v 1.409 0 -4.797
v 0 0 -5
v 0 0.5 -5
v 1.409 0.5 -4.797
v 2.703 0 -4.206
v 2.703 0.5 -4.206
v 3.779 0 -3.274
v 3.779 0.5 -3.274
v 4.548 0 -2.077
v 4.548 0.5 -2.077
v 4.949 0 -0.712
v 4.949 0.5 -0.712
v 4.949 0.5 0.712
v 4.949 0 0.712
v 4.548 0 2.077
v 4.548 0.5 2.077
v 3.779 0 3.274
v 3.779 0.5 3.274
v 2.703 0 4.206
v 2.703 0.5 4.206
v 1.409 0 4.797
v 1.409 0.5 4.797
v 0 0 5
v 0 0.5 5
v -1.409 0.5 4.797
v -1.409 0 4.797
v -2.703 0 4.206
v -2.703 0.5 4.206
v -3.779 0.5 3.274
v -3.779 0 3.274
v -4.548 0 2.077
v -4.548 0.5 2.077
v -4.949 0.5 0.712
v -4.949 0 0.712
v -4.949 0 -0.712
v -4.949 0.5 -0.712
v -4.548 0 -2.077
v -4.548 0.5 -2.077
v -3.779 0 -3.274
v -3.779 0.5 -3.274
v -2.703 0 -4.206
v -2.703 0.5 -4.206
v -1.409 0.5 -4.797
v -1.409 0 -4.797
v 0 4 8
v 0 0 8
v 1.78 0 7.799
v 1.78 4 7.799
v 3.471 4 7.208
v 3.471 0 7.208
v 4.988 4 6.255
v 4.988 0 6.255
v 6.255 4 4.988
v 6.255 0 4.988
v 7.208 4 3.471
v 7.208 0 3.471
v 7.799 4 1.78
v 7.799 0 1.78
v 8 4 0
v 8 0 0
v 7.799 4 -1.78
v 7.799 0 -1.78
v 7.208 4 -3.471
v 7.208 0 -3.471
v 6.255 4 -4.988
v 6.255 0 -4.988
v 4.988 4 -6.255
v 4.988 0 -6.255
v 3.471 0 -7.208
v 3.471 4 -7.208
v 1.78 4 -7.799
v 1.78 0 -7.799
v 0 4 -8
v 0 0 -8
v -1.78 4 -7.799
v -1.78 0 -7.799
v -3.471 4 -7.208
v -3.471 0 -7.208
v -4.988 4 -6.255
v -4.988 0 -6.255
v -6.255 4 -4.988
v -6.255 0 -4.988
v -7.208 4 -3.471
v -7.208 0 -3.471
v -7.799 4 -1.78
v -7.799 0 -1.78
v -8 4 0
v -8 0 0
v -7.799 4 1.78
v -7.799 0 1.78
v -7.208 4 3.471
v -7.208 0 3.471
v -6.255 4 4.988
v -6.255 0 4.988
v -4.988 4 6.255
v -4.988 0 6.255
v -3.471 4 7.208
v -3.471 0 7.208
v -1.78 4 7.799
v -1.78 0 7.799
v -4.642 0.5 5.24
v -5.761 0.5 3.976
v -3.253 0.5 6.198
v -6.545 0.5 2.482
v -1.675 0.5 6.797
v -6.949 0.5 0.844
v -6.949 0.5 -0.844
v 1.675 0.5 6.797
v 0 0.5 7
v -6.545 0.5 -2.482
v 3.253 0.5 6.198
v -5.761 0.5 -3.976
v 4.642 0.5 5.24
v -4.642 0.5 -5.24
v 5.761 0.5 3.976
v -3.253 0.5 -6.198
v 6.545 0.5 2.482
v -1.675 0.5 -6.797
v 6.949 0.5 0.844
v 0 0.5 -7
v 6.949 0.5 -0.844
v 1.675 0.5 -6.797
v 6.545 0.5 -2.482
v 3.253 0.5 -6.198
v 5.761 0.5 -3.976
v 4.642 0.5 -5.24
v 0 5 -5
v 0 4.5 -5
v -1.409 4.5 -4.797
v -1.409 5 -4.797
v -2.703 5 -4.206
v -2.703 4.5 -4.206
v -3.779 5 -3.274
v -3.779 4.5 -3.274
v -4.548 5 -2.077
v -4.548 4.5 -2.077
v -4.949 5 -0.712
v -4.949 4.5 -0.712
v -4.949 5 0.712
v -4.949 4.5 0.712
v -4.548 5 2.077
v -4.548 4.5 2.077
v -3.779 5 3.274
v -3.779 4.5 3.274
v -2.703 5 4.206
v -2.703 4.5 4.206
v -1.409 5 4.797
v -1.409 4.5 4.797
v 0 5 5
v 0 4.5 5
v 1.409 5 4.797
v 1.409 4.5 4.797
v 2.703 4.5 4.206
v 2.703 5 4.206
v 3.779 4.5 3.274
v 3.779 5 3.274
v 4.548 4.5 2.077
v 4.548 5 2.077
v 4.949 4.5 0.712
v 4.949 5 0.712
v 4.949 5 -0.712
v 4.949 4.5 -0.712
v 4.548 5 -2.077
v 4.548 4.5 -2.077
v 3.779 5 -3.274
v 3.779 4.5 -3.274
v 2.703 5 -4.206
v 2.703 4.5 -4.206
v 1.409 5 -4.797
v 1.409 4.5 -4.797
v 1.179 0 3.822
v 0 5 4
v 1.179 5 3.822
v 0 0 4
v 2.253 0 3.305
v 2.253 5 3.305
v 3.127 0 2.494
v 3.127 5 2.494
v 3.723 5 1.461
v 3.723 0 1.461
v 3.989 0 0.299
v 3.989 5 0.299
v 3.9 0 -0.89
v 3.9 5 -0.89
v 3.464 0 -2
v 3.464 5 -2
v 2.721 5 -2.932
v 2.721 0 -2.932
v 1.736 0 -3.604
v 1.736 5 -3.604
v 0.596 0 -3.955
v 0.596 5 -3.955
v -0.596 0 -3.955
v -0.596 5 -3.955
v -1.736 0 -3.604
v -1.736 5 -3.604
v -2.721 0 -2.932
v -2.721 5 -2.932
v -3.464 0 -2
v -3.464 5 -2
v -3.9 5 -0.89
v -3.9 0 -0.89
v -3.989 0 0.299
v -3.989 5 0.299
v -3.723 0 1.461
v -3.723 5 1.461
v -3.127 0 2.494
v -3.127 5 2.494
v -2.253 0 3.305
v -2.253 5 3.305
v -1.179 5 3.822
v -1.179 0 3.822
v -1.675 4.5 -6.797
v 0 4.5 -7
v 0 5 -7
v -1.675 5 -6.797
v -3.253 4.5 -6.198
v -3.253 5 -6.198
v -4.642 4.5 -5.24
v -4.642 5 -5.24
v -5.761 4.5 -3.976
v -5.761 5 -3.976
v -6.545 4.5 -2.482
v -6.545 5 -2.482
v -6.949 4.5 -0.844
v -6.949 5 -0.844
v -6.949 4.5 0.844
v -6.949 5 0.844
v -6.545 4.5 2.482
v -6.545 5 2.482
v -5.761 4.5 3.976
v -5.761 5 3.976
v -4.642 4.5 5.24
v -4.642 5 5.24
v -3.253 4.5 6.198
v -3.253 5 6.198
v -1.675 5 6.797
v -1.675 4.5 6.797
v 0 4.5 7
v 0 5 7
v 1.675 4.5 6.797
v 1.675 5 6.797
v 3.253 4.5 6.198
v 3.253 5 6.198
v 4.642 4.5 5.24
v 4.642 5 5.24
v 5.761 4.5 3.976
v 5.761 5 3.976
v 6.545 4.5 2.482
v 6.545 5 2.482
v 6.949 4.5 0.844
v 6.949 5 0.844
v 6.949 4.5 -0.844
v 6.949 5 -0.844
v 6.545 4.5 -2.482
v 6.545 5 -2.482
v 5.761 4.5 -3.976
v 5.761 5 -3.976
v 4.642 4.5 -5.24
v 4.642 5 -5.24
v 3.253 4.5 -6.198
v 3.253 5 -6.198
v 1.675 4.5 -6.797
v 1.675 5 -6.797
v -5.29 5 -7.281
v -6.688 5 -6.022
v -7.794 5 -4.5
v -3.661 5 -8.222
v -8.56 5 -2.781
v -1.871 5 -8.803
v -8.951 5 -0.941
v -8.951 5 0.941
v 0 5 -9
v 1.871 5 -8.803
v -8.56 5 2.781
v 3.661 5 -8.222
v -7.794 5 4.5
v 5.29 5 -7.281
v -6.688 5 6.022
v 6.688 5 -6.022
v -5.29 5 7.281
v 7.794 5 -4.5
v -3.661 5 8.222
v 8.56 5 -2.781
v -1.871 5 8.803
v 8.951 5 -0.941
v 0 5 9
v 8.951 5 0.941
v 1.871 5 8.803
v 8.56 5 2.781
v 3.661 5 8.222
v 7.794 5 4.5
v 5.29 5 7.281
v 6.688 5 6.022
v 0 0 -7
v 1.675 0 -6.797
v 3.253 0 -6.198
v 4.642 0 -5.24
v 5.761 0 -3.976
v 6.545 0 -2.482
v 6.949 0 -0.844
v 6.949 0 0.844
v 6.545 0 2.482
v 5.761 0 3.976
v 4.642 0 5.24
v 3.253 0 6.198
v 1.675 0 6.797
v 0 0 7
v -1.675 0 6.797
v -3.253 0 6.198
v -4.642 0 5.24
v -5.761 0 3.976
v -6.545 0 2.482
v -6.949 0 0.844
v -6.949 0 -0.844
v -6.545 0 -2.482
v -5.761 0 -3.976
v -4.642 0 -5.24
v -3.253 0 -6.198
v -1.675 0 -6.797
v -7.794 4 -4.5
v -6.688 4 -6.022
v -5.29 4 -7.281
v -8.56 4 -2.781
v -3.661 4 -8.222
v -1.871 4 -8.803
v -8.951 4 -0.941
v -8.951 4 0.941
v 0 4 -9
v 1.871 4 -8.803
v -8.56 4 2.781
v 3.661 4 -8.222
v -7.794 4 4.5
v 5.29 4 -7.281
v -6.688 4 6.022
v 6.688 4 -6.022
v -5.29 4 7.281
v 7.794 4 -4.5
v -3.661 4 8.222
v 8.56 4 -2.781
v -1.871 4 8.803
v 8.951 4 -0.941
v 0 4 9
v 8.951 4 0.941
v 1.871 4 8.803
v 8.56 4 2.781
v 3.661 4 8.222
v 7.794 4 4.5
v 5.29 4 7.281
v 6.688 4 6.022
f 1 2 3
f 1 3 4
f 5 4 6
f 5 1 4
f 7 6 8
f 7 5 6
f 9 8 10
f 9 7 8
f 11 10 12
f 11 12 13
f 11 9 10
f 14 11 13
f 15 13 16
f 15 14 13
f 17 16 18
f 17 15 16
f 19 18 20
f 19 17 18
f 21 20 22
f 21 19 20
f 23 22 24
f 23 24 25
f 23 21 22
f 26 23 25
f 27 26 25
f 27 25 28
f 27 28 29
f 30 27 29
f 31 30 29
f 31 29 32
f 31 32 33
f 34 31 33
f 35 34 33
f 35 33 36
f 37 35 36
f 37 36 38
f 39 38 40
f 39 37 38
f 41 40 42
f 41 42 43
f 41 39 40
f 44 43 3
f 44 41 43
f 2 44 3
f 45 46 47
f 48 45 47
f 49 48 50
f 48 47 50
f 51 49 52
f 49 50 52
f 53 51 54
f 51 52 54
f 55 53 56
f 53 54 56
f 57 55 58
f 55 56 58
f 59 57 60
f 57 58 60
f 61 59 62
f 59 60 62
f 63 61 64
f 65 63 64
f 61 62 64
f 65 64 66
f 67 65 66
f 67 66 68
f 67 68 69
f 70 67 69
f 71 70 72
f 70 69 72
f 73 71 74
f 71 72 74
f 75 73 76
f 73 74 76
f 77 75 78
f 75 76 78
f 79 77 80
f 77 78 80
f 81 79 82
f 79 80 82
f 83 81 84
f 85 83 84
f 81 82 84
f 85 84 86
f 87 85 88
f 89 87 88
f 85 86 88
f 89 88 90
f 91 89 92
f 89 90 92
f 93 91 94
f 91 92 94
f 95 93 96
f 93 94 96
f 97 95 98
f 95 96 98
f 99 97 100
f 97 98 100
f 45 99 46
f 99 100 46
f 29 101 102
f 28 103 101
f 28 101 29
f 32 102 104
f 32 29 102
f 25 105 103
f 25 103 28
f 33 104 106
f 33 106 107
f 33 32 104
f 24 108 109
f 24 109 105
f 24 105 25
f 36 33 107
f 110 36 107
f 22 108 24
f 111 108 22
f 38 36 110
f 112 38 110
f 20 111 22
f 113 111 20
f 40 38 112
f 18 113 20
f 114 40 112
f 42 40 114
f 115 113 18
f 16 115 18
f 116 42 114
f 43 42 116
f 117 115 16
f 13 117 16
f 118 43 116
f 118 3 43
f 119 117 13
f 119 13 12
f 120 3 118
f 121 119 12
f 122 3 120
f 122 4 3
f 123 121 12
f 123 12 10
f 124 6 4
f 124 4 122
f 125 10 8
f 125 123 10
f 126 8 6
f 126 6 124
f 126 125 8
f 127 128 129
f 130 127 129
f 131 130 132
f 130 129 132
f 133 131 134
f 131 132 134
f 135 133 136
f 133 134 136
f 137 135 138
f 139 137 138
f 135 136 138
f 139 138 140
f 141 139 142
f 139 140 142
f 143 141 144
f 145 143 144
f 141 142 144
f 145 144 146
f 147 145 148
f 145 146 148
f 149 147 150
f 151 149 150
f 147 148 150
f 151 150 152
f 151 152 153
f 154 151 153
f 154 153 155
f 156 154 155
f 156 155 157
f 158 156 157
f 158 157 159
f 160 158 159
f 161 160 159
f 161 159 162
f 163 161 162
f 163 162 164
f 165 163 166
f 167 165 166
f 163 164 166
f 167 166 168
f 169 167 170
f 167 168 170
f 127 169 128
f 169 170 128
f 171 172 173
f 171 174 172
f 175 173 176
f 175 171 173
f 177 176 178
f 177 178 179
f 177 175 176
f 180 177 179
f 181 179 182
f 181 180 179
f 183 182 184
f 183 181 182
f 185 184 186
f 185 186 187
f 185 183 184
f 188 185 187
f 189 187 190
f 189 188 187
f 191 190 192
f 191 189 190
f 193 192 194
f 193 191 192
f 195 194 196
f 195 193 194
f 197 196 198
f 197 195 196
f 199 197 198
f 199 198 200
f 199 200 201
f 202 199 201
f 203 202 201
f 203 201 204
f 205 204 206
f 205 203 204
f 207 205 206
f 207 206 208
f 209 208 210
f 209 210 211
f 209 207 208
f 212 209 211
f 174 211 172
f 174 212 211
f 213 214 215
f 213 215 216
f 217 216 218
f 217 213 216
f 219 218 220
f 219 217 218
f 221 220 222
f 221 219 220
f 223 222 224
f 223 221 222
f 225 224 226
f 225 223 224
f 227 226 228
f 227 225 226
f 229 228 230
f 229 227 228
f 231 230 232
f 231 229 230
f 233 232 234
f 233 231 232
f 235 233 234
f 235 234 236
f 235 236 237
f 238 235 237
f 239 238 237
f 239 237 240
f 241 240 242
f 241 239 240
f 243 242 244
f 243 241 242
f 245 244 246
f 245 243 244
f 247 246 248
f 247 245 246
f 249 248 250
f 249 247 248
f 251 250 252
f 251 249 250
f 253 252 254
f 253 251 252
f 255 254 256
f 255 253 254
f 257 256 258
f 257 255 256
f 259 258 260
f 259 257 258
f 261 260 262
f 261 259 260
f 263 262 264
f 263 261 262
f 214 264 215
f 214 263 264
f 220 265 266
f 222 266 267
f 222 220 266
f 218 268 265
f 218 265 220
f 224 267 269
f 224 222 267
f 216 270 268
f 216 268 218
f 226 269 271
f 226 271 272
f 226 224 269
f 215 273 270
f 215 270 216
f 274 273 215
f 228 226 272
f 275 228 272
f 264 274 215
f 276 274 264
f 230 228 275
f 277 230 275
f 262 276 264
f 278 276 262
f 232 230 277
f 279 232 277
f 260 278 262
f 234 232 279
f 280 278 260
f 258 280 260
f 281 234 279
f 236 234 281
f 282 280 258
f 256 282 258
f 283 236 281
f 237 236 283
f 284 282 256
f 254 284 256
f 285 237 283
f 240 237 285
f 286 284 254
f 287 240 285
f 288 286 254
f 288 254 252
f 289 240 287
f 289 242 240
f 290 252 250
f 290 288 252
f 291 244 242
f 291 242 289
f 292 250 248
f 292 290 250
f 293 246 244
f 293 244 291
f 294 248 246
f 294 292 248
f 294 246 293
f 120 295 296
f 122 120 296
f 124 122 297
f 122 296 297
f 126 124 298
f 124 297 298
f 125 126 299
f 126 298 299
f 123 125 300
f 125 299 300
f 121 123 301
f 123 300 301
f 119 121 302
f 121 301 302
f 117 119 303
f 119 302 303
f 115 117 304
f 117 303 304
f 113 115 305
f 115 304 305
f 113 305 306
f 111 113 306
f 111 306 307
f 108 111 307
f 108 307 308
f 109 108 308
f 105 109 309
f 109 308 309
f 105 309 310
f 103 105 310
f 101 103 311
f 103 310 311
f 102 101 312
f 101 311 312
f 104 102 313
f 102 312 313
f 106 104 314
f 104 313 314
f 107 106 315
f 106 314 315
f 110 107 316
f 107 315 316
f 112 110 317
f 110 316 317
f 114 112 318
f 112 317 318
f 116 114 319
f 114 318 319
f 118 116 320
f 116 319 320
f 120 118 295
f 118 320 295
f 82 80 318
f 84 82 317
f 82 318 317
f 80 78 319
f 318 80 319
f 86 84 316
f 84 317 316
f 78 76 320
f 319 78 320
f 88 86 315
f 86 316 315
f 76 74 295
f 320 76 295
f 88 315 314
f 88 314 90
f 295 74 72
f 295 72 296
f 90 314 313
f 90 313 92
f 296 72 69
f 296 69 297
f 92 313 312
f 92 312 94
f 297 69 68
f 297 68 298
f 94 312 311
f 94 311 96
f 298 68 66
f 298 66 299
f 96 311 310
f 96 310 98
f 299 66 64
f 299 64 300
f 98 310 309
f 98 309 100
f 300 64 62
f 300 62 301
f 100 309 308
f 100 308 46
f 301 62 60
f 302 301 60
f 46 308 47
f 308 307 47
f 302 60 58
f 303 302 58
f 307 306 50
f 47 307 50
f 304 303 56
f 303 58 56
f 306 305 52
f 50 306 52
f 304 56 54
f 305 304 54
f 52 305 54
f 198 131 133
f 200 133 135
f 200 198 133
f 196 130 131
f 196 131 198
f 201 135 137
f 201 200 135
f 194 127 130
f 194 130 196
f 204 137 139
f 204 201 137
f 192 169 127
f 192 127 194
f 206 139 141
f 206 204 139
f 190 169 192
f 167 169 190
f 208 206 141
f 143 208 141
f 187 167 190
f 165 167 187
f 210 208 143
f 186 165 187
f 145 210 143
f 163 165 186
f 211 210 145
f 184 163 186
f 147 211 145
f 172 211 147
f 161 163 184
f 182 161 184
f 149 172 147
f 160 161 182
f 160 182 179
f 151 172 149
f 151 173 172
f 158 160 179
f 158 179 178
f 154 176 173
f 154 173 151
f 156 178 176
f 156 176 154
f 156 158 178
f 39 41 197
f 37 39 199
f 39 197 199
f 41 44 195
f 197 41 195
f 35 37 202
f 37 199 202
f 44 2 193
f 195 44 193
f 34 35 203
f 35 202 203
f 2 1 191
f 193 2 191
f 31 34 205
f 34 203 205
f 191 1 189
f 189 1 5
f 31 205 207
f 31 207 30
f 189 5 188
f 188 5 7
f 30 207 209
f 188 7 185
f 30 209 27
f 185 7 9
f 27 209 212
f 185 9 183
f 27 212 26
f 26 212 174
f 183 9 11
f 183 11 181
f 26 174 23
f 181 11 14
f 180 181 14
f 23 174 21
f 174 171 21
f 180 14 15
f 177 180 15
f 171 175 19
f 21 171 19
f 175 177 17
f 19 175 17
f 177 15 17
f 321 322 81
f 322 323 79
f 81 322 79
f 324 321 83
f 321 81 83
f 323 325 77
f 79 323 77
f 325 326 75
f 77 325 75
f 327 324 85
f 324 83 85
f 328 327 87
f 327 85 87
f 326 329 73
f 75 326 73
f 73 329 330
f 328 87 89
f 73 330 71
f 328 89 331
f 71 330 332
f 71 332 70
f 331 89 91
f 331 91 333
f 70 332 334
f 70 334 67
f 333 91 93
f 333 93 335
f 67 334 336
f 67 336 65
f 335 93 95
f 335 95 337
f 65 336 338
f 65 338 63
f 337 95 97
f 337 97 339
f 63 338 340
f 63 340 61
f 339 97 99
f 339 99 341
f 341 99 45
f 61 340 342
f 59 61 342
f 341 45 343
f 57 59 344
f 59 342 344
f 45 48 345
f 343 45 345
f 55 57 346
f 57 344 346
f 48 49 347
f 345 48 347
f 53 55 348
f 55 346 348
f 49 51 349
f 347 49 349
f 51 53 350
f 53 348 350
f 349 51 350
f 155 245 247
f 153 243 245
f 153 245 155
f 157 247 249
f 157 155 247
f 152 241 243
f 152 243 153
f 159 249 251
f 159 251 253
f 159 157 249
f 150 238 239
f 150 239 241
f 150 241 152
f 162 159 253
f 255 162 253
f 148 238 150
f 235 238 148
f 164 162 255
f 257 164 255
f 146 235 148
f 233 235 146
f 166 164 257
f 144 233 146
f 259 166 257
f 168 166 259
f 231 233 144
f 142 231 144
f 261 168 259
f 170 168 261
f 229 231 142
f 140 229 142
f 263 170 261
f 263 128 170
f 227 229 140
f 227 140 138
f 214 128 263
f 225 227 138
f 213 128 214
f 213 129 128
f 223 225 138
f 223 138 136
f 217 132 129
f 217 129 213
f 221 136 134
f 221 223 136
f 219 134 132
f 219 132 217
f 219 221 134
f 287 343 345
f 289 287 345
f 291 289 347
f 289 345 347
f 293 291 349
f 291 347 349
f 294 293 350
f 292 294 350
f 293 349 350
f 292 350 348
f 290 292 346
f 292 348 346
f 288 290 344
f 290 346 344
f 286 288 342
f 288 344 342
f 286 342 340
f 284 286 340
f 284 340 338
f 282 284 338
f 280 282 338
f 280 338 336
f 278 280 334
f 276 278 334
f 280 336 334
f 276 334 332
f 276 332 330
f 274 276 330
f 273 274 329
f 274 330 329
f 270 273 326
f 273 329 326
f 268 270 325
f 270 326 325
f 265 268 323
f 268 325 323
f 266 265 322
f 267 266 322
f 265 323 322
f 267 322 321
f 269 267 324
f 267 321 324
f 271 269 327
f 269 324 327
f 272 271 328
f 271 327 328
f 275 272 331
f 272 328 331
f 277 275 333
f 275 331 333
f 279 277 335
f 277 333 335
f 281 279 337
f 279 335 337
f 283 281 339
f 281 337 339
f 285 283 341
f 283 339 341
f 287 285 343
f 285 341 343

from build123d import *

# Parameters (mm, degrees)
SKETCH1_R           = 8
SKETCH1_R_2         = 4
BOSS_EXTRUDE1_DEPTH = 4
SKETCH2_R           = 9
SKETCH2_R_2         = 4
BOSS_EXTRUDE2_DEPTH = 1
SKETCH3_R           = 7
SKETCH3_R_2         = 5
CUT_EXTRUDE1_DEPTH  = 0.5
CUT_EXTRUDE2_START  = -0.5
SKETCH4_R           = 7
SKETCH4_R_2         = 5
CUT_EXTRUDE2_DEPTH  = 0.5


with BuildPart() as part:
    # Sketch1 → Boss-Extrude1 (new body)
    with BuildSketch(Plane(origin=(0, 0, 0), x_dir=(1, 0, 0), z_dir=(0, 1, 0))):
        with Locations(Location((0, 0, 0), (0, 0, 270))):
            Circle(SKETCH1_R)
        with Locations(Location((0, 0, 0), (0, 0, 270))):
            Circle(SKETCH1_R_2, mode=Mode.SUBTRACT)
    extrude(amount=BOSS_EXTRUDE1_DEPTH)

    # Sketch2 → Boss-Extrude2 (add)
    with BuildSketch(Plane(origin=(0, 4, 0), x_dir=(1, 0, 0), z_dir=(0, 1, 0))):
        with Locations(Location((0, 0, 0), (0, 0, 270))):
            Circle(SKETCH2_R)
        with Locations(Location((0, 0, 0), (0, 0, 270))):
            Circle(SKETCH2_R_2, mode=Mode.SUBTRACT)
    extrude(amount=BOSS_EXTRUDE2_DEPTH)

    # Sketch3 → Cut-Extrude1 (cut)
    with BuildSketch(Plane.XZ):
        with Locations(Location((0, 0, 0), (0, 0, 270))):
            Circle(SKETCH3_R)
        with Locations(Location((0, 0, 0), (0, 0, 270))):
            Circle(SKETCH3_R_2, mode=Mode.SUBTRACT)
    extrude(amount=-CUT_EXTRUDE1_DEPTH, mode=Mode.SUBTRACT)

    # Sketch4 → Cut-Extrude2 (cut)
    with BuildSketch(Plane(origin=(0, 5, 0), x_dir=(1, 0, 0), z_dir=(0, 1, 0)).offset(CUT_EXTRUDE2_START)):
        with Locations(Location((0, 0, 0), (0, 0, 90))):
            Circle(SKETCH4_R)
        with Locations(Location((0, 0, 0), (0, 0, 90))):
            Circle(SKETCH4_R_2, mode=Mode.SUBTRACT)
    extrude(amount=CUT_EXTRUDE2_DEPTH, mode=Mode.SUBTRACT)


solid = part.part
